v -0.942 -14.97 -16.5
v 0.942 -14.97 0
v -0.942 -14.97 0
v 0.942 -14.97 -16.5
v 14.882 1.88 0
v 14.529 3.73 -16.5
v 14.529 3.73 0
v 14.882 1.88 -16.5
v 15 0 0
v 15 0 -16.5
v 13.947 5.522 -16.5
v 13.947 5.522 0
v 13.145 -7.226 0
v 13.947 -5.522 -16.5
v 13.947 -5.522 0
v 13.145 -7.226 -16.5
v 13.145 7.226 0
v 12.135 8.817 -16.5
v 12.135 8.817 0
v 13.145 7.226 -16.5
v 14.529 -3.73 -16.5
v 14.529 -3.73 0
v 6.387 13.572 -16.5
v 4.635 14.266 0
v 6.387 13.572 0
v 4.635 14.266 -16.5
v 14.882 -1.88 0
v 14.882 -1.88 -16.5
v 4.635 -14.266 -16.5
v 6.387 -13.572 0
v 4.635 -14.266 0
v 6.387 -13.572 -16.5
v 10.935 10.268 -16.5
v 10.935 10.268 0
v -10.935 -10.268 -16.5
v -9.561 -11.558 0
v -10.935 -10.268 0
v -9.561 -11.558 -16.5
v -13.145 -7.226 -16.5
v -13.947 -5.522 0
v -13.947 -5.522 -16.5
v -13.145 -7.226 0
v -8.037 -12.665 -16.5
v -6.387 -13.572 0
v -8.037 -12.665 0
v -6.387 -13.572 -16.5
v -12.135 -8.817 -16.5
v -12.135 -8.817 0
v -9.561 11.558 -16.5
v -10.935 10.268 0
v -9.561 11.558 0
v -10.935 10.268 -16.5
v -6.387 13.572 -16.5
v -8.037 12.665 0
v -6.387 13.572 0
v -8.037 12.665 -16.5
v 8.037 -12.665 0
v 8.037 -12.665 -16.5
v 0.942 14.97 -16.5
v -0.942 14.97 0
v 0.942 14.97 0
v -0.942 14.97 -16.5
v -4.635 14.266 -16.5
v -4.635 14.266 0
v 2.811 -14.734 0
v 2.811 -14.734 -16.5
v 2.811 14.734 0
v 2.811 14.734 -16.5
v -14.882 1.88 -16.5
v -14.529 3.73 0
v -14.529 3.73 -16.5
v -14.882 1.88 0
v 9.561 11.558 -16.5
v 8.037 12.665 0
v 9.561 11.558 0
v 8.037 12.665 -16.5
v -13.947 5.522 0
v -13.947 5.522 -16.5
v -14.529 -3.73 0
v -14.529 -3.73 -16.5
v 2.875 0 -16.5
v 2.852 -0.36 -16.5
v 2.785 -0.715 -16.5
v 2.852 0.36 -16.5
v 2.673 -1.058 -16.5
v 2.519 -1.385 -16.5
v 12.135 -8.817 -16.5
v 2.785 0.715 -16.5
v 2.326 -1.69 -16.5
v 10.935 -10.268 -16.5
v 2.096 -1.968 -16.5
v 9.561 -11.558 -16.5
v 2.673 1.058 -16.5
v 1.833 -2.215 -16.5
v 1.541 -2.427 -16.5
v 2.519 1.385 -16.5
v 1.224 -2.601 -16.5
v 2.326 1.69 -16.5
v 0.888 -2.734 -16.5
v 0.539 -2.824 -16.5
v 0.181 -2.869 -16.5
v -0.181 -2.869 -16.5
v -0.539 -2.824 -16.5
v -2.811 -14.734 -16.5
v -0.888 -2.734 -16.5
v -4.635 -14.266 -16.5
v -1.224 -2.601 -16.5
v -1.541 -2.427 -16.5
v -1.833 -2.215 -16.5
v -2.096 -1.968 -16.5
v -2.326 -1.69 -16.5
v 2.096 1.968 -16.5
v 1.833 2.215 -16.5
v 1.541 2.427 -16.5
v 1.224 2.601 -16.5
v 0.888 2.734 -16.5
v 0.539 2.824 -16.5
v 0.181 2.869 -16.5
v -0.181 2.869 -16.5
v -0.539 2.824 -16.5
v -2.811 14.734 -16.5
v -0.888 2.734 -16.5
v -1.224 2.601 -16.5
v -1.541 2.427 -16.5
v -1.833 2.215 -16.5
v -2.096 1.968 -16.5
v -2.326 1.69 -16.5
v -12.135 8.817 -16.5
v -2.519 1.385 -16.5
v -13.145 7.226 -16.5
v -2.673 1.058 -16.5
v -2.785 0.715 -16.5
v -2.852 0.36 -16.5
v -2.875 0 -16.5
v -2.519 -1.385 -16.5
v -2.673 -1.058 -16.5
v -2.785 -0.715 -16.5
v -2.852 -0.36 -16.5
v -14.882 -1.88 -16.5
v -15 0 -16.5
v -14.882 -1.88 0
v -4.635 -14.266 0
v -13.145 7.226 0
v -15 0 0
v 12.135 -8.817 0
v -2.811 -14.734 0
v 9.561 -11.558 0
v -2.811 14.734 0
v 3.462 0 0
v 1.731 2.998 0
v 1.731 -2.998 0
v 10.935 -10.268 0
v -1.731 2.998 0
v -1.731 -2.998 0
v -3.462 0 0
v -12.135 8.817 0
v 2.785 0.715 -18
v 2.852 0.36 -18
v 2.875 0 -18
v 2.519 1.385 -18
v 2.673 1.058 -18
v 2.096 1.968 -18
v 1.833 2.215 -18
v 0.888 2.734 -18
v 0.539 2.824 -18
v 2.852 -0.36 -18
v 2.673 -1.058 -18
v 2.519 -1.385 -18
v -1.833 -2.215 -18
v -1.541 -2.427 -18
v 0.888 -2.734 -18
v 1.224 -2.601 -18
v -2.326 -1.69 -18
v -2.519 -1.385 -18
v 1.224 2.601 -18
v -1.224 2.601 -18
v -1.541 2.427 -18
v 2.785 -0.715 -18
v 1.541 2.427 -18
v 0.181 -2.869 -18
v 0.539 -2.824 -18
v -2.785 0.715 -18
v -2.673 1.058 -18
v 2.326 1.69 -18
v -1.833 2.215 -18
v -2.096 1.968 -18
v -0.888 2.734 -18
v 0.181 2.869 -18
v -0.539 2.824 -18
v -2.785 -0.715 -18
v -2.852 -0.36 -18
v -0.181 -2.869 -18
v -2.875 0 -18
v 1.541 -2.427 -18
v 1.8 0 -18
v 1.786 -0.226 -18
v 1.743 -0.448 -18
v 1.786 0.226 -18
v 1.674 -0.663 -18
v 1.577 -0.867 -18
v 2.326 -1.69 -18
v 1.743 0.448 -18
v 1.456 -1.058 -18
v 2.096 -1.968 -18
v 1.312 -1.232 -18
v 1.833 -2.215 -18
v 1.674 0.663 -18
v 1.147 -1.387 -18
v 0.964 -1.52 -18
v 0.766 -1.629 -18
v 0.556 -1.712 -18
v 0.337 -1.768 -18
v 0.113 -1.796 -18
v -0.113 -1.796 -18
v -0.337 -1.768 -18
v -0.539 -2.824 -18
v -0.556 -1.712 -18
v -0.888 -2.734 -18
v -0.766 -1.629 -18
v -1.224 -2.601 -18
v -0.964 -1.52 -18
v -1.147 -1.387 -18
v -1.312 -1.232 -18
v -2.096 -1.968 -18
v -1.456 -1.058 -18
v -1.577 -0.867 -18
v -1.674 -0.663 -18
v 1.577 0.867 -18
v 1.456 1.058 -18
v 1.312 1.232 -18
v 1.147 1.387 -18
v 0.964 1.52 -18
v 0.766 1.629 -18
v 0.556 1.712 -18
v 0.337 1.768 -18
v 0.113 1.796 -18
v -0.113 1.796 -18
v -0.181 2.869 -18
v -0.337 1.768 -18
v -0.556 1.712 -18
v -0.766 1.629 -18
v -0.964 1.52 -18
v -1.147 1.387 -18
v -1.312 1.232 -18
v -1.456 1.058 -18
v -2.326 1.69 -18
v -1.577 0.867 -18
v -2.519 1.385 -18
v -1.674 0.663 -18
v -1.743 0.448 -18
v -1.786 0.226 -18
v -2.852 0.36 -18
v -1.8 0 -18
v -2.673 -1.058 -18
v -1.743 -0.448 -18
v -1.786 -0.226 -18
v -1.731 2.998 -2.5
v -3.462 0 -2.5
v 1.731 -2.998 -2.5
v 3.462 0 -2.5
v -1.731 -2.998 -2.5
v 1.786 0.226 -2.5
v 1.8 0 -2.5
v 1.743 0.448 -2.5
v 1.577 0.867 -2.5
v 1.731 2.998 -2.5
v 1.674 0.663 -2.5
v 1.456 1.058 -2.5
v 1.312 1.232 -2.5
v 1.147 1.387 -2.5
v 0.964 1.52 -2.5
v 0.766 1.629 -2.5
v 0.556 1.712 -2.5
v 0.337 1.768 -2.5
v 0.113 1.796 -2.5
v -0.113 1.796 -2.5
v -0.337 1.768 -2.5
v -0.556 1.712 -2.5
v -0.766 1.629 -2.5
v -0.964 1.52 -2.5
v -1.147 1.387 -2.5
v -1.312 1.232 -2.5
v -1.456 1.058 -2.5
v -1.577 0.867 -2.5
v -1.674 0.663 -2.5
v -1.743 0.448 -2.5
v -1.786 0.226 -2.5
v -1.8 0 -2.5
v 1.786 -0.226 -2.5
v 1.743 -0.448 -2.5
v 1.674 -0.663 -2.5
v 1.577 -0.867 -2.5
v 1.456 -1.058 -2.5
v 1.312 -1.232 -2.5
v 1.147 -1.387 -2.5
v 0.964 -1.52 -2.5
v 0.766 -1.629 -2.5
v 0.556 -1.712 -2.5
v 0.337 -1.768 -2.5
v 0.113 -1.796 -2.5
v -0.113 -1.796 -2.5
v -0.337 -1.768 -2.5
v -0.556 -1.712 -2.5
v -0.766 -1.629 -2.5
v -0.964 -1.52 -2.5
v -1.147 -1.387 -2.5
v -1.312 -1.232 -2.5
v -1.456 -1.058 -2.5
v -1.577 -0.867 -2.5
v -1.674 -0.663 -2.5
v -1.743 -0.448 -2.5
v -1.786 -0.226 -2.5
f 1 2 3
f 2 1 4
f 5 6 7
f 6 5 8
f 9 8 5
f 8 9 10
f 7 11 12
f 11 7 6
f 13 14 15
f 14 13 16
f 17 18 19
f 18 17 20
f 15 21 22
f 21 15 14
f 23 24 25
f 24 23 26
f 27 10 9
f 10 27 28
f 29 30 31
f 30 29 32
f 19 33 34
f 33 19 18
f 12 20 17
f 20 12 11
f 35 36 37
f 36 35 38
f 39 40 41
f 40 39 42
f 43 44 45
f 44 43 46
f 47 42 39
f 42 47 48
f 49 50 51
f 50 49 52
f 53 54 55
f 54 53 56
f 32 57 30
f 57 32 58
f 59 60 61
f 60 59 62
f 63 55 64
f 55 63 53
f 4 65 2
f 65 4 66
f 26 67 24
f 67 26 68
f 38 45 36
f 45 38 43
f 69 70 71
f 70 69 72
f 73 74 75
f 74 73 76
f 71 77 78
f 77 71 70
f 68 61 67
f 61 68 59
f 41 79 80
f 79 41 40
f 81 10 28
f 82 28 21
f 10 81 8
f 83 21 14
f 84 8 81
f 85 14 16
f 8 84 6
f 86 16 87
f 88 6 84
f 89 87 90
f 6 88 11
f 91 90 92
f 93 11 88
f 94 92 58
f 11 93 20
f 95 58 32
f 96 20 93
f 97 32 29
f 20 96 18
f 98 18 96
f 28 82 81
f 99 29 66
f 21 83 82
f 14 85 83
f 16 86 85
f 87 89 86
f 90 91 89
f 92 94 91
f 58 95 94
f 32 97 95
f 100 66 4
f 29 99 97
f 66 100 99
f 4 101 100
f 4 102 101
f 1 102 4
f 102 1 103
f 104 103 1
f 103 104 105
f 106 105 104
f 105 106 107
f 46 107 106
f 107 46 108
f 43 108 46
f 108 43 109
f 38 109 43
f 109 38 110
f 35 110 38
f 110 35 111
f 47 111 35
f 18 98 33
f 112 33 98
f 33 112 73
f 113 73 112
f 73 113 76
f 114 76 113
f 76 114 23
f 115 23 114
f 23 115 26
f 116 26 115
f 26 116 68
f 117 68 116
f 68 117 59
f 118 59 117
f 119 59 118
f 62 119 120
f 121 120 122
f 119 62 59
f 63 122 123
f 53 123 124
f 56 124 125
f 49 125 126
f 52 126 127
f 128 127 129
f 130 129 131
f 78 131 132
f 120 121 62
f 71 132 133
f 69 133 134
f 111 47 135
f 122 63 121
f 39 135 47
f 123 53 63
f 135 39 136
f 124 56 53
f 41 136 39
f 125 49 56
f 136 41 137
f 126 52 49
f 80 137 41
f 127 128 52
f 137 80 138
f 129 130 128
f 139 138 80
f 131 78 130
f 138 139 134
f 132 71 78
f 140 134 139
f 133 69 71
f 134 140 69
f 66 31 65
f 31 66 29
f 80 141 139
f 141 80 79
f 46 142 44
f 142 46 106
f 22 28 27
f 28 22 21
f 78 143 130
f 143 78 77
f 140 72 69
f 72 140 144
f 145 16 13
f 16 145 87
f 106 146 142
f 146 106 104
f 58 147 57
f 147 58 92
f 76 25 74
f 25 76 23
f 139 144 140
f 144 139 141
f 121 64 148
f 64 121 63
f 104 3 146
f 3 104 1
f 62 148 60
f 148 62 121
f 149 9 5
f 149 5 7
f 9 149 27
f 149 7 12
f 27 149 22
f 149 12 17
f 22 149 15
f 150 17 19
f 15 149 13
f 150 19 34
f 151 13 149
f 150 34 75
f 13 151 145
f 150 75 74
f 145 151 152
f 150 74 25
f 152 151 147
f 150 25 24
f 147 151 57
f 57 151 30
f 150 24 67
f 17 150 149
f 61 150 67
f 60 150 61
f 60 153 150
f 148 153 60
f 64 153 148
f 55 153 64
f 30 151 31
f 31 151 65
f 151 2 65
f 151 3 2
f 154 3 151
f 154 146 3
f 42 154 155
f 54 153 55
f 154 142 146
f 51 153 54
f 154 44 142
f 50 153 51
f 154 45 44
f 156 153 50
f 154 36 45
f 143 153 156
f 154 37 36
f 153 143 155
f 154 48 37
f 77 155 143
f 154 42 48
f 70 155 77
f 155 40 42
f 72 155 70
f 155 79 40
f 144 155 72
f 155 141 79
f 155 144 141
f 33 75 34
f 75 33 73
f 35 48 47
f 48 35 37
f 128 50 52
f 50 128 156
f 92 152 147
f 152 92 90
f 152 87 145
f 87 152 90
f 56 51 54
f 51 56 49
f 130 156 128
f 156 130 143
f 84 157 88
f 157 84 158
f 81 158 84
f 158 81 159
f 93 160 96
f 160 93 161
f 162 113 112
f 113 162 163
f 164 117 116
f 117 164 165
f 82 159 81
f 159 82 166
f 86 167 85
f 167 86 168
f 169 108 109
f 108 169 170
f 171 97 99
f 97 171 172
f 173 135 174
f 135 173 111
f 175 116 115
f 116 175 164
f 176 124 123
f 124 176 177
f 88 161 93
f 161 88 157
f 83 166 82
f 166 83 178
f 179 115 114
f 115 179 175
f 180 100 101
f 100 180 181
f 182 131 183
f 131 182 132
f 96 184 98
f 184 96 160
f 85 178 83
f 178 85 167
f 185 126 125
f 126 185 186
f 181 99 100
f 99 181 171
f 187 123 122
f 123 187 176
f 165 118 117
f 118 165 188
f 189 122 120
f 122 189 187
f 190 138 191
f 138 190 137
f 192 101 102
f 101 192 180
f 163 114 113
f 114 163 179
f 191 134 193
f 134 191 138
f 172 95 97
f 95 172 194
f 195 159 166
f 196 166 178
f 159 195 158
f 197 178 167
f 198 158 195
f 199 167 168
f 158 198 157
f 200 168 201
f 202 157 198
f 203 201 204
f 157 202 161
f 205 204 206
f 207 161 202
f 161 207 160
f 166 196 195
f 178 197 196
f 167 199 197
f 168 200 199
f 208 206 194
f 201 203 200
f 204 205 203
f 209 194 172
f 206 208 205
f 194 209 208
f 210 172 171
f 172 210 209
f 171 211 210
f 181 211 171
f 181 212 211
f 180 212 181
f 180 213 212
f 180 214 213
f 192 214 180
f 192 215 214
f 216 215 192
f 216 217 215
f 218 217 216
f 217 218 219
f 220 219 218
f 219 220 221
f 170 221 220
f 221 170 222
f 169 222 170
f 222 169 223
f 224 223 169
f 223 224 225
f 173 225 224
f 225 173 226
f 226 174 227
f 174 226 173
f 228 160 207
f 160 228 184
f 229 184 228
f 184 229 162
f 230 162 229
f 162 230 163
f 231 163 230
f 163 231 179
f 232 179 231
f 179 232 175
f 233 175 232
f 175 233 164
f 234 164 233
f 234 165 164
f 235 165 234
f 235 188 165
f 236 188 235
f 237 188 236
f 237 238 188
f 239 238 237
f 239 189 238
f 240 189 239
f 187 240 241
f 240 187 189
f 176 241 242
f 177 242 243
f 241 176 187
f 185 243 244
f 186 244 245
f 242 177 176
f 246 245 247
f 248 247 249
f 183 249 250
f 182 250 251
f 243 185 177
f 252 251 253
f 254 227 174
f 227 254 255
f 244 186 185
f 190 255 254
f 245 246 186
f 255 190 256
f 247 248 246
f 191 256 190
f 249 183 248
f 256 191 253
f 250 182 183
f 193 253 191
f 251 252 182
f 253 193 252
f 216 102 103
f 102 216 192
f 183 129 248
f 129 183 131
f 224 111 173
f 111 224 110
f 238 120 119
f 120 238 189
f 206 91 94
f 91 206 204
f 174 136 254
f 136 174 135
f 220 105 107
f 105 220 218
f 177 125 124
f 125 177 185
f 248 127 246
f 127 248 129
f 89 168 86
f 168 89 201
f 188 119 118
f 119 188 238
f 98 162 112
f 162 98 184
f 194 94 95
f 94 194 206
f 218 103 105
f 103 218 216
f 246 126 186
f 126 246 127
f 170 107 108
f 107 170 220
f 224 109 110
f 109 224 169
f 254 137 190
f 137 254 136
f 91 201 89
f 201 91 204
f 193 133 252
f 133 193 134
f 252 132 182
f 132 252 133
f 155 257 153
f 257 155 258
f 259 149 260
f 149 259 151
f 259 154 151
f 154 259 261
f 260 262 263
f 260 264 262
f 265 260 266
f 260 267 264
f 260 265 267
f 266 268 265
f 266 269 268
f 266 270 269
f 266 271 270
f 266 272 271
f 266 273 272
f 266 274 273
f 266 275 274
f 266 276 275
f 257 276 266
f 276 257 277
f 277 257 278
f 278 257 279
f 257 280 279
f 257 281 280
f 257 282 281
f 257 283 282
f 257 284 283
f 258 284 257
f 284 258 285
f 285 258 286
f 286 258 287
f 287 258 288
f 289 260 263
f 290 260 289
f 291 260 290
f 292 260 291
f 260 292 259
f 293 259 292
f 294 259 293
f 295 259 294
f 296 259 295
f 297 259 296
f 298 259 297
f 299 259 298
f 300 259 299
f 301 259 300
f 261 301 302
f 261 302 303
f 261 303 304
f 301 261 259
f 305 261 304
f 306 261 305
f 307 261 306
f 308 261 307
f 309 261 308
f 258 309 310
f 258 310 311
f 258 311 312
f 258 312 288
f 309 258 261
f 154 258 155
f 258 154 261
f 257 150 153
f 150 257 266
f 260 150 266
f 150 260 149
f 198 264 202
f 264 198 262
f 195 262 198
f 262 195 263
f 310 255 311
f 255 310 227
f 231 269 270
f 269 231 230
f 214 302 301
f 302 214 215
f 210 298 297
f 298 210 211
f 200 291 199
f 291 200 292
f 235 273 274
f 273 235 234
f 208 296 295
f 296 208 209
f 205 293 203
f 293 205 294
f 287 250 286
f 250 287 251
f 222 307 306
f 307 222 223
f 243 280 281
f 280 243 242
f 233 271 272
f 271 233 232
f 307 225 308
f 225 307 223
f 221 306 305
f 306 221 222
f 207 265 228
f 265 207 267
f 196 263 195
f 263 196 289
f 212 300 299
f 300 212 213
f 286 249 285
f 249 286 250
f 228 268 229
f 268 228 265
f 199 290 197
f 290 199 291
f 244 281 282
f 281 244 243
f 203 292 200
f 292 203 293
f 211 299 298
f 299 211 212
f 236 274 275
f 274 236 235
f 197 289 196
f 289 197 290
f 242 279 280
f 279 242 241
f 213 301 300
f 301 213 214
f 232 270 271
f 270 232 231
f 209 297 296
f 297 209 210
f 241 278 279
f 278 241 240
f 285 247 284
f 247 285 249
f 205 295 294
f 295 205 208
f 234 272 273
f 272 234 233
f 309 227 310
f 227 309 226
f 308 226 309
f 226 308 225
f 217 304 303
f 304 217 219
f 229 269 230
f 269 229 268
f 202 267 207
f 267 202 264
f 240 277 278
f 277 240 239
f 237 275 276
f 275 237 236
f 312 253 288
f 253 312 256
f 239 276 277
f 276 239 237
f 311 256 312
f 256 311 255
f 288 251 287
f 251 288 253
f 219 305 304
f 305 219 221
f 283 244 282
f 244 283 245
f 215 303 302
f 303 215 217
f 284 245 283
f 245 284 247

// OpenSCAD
$fn = 50;

difference() {
	union() {
		translate(v = [0, 0, -16.5]) {
			cylinder(h = 16.5, r = 15.0);
		}
		#translate(v = [0, 0, -18.0]) {
			cylinder(h = 18, r = 2.875);
		}
	}
	union() {
		translate(v = [0, 0, 0]) {
			rotate(a = [0, 0, 0]) {
				difference() {
					union() {
						translate(v = [0, 0, -2.5]) {
							linear_extrude(height = 2.5) {
								polygon(points = [[3.4619999999999997, 0.0], [1.7310000000000003, 2.9981799479017264], [-1.7309999999999992, 2.9981799479017264], [-3.4619999999999997, 4.2397272186481365e-16], [-1.7310000000000014, -2.998179947901726], [1.7309999999999977, -2.9981799479017277]]);
							}
						}
					}
					union();
				}
			}
		}
		#translate(v = [0, 0, -100.0]) {
			cylinder(h = 200, r = 1.8);
		}
	}
}
